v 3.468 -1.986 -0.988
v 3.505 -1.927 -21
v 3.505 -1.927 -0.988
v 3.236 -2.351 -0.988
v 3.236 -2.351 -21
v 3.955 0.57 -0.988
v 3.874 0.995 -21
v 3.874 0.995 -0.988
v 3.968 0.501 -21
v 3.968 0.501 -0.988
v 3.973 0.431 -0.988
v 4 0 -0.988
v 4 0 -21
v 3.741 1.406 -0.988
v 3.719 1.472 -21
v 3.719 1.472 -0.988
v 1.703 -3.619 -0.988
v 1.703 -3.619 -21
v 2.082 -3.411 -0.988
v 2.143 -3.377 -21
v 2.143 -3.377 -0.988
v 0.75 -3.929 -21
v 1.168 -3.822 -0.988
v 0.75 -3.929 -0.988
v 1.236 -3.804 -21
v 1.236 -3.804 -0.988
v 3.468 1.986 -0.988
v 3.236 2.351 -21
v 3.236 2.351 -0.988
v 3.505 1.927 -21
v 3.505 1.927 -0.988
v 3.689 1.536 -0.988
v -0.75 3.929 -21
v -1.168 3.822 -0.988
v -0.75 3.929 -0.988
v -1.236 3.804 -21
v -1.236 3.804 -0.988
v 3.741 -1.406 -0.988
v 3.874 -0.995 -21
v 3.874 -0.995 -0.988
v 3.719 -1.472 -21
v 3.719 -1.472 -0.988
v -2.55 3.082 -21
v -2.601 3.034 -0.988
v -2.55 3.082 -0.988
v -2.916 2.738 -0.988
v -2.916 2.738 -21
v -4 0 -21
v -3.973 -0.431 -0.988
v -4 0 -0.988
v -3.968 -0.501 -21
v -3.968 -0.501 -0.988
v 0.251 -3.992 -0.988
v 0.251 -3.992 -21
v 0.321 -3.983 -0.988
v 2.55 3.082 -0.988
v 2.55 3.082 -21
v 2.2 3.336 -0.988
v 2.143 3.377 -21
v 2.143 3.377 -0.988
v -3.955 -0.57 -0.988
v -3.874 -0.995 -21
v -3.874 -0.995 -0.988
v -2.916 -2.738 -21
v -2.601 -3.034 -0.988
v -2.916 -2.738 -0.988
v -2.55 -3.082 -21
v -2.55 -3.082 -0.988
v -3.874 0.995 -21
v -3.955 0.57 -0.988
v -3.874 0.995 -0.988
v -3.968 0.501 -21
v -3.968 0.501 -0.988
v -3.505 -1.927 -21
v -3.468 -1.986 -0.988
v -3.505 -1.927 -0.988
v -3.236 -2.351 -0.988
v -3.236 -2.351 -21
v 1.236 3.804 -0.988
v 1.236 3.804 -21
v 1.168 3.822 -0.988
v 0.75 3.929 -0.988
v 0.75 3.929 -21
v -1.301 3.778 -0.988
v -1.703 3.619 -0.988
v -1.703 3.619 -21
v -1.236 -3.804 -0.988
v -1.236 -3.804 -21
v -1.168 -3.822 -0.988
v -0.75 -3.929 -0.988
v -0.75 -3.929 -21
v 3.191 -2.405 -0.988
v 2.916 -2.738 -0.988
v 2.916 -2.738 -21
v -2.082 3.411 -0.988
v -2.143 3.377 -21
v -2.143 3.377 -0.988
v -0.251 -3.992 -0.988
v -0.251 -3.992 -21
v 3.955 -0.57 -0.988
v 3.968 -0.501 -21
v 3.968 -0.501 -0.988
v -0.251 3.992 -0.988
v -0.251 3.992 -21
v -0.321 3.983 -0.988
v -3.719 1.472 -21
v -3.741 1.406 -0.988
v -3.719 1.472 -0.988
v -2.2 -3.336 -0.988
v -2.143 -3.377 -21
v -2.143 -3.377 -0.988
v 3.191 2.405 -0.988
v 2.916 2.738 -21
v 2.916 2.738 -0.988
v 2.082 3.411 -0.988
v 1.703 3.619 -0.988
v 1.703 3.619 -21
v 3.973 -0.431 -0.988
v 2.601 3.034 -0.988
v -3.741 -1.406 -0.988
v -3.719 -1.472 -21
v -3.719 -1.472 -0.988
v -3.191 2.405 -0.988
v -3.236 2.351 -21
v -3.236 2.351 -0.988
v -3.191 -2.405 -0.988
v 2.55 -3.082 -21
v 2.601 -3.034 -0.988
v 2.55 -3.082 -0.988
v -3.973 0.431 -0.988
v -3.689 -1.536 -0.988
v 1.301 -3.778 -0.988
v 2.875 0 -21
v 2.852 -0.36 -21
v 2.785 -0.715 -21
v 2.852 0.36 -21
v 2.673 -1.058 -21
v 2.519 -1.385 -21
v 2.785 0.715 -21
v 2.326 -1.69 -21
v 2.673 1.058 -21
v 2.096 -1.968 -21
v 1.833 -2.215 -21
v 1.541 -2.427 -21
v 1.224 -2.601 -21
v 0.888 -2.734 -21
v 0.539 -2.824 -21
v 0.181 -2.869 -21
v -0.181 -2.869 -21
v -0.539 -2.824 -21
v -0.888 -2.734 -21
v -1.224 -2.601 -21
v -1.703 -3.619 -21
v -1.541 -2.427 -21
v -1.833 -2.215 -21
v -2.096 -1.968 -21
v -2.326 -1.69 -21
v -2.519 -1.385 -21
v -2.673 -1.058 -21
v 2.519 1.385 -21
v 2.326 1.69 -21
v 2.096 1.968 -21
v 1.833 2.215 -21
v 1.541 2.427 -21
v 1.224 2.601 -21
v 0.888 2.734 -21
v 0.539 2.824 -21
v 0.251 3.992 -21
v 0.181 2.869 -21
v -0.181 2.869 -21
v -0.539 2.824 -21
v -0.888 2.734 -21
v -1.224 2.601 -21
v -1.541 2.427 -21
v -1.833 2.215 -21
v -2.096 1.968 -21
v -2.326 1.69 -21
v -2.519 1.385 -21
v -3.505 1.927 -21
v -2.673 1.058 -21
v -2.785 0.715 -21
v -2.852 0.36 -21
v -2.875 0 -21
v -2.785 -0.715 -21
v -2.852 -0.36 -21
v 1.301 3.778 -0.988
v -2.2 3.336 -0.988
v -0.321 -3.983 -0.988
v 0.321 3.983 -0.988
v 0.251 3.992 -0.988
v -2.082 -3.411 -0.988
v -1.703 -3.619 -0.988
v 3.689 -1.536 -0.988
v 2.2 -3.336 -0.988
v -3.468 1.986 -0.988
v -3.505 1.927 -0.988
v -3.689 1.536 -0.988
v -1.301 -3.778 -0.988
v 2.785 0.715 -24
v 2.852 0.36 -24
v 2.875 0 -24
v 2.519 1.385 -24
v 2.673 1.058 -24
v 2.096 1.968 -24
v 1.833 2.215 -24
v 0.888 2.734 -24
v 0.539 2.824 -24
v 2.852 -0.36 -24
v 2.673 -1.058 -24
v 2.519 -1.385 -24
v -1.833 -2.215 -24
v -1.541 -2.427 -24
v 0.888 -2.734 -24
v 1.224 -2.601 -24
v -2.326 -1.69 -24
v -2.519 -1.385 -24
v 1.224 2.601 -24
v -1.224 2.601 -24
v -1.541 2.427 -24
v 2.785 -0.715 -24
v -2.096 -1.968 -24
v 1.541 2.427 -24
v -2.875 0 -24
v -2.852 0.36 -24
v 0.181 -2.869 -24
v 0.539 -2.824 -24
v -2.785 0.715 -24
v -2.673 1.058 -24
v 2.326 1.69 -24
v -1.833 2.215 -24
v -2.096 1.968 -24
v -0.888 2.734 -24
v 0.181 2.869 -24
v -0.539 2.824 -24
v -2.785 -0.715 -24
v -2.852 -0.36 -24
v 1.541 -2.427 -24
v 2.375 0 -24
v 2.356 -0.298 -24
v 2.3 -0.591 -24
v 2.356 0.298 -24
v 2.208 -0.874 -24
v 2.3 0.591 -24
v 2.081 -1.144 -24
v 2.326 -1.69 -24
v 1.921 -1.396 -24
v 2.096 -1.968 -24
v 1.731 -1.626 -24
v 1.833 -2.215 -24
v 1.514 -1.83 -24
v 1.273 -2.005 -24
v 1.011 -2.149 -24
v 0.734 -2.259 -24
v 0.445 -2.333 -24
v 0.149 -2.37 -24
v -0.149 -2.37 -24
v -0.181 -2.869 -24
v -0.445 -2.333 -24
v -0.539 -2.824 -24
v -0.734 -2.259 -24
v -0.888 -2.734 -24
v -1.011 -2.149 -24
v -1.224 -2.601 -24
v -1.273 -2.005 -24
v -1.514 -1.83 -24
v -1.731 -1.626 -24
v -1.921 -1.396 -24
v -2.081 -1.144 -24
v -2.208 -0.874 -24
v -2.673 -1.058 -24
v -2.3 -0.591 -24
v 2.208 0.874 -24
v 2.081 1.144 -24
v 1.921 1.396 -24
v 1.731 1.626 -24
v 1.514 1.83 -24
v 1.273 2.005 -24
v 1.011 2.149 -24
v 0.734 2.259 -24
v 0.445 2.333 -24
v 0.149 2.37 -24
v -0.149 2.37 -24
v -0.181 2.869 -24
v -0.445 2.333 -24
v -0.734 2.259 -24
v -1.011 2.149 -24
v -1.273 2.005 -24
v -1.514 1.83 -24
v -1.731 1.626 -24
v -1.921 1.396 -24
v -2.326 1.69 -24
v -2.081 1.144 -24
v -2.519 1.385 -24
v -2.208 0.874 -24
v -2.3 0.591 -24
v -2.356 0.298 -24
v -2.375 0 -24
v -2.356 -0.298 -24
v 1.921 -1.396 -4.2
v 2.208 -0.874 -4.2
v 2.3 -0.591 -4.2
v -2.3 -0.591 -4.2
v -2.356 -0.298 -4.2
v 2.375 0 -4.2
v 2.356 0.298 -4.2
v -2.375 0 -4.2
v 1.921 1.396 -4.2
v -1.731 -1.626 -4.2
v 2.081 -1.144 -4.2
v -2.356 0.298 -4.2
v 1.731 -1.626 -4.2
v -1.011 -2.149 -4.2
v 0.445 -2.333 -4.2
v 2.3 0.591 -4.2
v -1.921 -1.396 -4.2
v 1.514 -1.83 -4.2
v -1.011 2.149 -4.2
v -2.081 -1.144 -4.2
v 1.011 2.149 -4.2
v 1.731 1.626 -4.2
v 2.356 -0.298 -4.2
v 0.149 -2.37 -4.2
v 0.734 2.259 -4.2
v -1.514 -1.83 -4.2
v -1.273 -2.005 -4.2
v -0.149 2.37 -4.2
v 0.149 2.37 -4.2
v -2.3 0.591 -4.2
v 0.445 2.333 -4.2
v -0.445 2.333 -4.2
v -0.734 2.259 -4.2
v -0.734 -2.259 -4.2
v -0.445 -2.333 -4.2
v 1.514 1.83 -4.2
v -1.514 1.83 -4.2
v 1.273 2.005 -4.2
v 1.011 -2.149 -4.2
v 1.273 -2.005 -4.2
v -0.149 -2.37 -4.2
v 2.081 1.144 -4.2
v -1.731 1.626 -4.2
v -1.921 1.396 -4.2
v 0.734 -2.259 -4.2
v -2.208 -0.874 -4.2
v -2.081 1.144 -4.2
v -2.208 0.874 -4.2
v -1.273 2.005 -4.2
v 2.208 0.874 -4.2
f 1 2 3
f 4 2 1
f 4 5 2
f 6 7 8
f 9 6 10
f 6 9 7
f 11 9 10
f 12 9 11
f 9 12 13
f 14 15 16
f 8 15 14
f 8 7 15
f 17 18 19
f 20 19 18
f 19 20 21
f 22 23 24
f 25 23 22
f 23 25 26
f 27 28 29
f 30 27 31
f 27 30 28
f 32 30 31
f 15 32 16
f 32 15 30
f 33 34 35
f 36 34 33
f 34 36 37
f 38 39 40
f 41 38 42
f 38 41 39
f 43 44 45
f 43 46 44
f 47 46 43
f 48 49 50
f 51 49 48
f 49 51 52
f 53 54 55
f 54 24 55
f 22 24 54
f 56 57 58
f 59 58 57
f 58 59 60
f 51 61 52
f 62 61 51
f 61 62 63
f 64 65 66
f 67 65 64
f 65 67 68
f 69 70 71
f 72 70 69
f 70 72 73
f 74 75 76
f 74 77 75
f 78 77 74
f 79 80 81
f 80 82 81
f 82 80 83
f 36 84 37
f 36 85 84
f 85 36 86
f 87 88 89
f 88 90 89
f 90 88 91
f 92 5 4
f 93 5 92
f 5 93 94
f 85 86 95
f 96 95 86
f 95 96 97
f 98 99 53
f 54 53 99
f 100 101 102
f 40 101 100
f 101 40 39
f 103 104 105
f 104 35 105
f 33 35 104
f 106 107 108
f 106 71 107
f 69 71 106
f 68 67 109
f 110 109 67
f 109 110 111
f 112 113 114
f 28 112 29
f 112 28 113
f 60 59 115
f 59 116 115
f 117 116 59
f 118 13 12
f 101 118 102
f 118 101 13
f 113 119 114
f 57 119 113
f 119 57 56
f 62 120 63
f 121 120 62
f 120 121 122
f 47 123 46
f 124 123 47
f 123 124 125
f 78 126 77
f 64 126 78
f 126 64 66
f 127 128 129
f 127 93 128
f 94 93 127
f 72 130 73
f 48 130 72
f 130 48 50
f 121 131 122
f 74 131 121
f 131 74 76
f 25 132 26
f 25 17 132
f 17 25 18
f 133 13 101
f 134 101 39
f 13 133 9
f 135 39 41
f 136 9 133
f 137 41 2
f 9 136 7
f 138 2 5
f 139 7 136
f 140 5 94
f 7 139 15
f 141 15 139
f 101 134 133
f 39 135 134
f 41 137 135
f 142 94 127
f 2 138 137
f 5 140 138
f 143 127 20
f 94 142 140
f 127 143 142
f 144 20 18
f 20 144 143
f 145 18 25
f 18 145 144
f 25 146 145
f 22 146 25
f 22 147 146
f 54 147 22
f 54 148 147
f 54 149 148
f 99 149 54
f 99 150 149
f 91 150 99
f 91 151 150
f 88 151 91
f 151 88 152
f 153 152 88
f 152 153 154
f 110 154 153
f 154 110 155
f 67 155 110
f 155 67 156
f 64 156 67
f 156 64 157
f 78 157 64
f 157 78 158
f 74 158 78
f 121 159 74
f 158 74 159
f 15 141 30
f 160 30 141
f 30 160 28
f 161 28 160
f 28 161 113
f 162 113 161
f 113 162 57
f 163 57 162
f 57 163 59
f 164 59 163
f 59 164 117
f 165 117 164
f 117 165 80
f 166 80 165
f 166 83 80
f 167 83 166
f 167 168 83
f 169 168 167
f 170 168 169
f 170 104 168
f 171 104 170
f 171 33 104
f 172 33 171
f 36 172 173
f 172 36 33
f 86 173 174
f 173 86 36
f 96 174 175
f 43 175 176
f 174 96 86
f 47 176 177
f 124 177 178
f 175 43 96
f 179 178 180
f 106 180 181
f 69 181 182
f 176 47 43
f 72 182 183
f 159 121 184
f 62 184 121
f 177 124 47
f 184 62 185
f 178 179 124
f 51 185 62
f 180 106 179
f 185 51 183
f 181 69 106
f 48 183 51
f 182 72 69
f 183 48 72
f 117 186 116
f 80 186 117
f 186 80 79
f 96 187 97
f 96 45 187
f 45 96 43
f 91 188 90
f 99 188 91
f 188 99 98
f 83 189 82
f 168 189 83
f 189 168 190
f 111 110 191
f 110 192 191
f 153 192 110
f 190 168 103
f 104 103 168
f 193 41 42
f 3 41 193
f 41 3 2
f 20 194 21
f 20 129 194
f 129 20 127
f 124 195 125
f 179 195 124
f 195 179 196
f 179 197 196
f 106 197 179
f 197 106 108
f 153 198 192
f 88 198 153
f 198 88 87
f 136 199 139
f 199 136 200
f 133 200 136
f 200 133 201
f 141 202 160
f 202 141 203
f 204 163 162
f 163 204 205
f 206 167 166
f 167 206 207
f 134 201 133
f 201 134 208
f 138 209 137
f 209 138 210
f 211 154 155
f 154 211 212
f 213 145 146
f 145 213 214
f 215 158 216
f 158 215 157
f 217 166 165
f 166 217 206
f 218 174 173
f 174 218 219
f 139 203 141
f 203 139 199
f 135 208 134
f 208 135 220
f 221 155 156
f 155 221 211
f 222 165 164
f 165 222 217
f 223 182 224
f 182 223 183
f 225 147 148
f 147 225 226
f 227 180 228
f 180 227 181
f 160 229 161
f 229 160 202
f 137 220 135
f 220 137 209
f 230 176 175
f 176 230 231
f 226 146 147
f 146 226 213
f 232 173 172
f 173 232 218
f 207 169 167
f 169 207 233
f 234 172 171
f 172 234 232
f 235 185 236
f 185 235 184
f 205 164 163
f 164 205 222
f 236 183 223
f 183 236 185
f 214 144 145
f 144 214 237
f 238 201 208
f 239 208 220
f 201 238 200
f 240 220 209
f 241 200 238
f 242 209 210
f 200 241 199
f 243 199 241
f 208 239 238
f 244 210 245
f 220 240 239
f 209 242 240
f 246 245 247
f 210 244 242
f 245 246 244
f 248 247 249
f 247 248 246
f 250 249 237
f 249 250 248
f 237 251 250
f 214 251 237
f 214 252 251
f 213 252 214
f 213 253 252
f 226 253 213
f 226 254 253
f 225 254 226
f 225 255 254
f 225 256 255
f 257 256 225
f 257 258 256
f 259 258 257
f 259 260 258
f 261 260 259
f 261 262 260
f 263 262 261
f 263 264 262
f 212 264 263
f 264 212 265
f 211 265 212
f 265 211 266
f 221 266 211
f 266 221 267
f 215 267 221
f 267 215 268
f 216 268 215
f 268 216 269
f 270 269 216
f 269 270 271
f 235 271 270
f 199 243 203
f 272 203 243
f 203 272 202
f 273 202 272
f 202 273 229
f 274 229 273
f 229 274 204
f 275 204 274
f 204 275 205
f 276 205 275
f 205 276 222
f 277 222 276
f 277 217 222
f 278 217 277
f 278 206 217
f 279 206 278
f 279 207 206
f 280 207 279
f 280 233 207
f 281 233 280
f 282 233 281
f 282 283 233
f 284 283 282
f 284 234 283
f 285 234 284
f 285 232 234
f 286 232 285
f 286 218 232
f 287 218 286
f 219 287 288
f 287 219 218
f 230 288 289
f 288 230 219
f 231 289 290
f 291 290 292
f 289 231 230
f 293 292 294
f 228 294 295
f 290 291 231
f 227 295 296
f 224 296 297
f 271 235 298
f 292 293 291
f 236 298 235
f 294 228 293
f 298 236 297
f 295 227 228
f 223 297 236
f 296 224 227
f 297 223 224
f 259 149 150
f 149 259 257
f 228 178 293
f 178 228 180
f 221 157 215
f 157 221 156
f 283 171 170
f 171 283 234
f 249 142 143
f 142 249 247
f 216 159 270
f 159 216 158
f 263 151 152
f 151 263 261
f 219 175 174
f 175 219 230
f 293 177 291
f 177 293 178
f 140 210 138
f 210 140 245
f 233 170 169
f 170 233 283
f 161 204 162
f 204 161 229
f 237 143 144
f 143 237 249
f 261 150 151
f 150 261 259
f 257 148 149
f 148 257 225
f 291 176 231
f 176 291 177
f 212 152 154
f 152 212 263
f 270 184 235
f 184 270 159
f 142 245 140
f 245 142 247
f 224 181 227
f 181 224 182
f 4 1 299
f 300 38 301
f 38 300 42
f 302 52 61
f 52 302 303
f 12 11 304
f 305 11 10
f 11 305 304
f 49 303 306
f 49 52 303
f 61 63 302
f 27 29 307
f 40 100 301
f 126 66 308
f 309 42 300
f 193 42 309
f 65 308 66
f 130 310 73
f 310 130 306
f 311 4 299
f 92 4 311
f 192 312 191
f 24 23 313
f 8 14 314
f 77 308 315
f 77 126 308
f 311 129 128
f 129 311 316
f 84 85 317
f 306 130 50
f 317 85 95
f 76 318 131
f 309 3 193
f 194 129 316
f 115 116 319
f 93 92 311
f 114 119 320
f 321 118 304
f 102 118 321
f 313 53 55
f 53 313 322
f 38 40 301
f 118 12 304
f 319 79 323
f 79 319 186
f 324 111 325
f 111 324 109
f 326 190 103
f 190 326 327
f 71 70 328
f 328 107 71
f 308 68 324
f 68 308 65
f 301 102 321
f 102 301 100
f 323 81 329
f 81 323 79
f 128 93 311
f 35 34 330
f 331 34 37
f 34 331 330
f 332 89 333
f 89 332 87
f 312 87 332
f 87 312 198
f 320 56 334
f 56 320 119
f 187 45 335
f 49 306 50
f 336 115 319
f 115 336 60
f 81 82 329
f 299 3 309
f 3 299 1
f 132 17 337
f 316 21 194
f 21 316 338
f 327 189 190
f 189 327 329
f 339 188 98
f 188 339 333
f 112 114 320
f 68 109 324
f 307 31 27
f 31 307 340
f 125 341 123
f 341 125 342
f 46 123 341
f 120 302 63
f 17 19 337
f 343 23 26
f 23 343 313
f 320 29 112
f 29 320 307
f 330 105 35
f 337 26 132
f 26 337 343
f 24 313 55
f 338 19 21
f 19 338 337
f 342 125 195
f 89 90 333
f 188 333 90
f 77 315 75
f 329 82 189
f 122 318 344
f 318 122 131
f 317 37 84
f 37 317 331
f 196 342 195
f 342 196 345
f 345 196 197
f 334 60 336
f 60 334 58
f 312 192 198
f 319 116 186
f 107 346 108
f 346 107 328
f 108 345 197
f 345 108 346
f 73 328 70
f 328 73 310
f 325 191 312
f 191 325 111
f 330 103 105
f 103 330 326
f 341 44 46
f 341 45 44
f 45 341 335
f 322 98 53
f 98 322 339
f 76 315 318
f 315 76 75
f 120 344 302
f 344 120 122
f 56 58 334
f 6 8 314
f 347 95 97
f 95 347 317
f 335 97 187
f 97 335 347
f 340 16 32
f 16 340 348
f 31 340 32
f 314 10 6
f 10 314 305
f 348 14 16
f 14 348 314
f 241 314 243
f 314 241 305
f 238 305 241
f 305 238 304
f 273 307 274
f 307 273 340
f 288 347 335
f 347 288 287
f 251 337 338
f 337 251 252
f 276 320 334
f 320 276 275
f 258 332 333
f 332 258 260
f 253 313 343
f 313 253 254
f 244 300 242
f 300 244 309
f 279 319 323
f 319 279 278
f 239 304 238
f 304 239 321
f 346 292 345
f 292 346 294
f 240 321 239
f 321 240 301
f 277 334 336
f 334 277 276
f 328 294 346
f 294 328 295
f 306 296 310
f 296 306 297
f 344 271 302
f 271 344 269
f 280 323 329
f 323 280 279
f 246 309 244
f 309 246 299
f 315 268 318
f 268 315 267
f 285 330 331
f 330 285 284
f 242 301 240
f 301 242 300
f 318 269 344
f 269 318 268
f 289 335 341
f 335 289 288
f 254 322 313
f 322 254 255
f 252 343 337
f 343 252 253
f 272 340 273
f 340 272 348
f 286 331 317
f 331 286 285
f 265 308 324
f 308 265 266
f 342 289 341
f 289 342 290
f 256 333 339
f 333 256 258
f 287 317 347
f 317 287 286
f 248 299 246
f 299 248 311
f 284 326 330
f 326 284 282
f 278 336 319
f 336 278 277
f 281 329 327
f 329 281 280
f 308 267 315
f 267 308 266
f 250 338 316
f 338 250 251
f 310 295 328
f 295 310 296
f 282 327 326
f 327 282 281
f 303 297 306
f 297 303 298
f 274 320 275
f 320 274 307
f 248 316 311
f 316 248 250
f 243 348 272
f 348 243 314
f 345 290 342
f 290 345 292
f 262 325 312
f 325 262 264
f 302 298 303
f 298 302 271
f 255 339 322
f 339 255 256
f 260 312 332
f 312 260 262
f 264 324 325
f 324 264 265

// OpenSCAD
$fn = 50;

difference() {
	union() {
		translate(v = [0, 0, -21.0]) {
			cylinder(h = 24, r = 4.0);
		}
		#translate(v = [0, 0, -24.0]) {
			cylinder(h = 24, r = 2.875);
		}
	}
	union() {
		translate(v = [0, 0, 0]) {
			rotate(a = [0, 0, 0]) {
				difference() {
					union() {
						translate(v = [0, 0, -24.0]) {
							cylinder(h = 24, r = 2.25);
						}
						translate(v = [0, 0, -4.2]) {
							cylinder(h = 4.2, r1 = 2.375, r2 = 4.5);
						}
						translate(v = [0, 0, -24.0]) {
							cylinder(h = 24, r = 2.375);
						}
						translate(v = [0, 0, -24.0]) {
							cylinder(h = 24, r = 2.25);
						}
					}
					union();
				}
			}
		}
		#cylinder(h = 3, r = 5.0);
	}
}
